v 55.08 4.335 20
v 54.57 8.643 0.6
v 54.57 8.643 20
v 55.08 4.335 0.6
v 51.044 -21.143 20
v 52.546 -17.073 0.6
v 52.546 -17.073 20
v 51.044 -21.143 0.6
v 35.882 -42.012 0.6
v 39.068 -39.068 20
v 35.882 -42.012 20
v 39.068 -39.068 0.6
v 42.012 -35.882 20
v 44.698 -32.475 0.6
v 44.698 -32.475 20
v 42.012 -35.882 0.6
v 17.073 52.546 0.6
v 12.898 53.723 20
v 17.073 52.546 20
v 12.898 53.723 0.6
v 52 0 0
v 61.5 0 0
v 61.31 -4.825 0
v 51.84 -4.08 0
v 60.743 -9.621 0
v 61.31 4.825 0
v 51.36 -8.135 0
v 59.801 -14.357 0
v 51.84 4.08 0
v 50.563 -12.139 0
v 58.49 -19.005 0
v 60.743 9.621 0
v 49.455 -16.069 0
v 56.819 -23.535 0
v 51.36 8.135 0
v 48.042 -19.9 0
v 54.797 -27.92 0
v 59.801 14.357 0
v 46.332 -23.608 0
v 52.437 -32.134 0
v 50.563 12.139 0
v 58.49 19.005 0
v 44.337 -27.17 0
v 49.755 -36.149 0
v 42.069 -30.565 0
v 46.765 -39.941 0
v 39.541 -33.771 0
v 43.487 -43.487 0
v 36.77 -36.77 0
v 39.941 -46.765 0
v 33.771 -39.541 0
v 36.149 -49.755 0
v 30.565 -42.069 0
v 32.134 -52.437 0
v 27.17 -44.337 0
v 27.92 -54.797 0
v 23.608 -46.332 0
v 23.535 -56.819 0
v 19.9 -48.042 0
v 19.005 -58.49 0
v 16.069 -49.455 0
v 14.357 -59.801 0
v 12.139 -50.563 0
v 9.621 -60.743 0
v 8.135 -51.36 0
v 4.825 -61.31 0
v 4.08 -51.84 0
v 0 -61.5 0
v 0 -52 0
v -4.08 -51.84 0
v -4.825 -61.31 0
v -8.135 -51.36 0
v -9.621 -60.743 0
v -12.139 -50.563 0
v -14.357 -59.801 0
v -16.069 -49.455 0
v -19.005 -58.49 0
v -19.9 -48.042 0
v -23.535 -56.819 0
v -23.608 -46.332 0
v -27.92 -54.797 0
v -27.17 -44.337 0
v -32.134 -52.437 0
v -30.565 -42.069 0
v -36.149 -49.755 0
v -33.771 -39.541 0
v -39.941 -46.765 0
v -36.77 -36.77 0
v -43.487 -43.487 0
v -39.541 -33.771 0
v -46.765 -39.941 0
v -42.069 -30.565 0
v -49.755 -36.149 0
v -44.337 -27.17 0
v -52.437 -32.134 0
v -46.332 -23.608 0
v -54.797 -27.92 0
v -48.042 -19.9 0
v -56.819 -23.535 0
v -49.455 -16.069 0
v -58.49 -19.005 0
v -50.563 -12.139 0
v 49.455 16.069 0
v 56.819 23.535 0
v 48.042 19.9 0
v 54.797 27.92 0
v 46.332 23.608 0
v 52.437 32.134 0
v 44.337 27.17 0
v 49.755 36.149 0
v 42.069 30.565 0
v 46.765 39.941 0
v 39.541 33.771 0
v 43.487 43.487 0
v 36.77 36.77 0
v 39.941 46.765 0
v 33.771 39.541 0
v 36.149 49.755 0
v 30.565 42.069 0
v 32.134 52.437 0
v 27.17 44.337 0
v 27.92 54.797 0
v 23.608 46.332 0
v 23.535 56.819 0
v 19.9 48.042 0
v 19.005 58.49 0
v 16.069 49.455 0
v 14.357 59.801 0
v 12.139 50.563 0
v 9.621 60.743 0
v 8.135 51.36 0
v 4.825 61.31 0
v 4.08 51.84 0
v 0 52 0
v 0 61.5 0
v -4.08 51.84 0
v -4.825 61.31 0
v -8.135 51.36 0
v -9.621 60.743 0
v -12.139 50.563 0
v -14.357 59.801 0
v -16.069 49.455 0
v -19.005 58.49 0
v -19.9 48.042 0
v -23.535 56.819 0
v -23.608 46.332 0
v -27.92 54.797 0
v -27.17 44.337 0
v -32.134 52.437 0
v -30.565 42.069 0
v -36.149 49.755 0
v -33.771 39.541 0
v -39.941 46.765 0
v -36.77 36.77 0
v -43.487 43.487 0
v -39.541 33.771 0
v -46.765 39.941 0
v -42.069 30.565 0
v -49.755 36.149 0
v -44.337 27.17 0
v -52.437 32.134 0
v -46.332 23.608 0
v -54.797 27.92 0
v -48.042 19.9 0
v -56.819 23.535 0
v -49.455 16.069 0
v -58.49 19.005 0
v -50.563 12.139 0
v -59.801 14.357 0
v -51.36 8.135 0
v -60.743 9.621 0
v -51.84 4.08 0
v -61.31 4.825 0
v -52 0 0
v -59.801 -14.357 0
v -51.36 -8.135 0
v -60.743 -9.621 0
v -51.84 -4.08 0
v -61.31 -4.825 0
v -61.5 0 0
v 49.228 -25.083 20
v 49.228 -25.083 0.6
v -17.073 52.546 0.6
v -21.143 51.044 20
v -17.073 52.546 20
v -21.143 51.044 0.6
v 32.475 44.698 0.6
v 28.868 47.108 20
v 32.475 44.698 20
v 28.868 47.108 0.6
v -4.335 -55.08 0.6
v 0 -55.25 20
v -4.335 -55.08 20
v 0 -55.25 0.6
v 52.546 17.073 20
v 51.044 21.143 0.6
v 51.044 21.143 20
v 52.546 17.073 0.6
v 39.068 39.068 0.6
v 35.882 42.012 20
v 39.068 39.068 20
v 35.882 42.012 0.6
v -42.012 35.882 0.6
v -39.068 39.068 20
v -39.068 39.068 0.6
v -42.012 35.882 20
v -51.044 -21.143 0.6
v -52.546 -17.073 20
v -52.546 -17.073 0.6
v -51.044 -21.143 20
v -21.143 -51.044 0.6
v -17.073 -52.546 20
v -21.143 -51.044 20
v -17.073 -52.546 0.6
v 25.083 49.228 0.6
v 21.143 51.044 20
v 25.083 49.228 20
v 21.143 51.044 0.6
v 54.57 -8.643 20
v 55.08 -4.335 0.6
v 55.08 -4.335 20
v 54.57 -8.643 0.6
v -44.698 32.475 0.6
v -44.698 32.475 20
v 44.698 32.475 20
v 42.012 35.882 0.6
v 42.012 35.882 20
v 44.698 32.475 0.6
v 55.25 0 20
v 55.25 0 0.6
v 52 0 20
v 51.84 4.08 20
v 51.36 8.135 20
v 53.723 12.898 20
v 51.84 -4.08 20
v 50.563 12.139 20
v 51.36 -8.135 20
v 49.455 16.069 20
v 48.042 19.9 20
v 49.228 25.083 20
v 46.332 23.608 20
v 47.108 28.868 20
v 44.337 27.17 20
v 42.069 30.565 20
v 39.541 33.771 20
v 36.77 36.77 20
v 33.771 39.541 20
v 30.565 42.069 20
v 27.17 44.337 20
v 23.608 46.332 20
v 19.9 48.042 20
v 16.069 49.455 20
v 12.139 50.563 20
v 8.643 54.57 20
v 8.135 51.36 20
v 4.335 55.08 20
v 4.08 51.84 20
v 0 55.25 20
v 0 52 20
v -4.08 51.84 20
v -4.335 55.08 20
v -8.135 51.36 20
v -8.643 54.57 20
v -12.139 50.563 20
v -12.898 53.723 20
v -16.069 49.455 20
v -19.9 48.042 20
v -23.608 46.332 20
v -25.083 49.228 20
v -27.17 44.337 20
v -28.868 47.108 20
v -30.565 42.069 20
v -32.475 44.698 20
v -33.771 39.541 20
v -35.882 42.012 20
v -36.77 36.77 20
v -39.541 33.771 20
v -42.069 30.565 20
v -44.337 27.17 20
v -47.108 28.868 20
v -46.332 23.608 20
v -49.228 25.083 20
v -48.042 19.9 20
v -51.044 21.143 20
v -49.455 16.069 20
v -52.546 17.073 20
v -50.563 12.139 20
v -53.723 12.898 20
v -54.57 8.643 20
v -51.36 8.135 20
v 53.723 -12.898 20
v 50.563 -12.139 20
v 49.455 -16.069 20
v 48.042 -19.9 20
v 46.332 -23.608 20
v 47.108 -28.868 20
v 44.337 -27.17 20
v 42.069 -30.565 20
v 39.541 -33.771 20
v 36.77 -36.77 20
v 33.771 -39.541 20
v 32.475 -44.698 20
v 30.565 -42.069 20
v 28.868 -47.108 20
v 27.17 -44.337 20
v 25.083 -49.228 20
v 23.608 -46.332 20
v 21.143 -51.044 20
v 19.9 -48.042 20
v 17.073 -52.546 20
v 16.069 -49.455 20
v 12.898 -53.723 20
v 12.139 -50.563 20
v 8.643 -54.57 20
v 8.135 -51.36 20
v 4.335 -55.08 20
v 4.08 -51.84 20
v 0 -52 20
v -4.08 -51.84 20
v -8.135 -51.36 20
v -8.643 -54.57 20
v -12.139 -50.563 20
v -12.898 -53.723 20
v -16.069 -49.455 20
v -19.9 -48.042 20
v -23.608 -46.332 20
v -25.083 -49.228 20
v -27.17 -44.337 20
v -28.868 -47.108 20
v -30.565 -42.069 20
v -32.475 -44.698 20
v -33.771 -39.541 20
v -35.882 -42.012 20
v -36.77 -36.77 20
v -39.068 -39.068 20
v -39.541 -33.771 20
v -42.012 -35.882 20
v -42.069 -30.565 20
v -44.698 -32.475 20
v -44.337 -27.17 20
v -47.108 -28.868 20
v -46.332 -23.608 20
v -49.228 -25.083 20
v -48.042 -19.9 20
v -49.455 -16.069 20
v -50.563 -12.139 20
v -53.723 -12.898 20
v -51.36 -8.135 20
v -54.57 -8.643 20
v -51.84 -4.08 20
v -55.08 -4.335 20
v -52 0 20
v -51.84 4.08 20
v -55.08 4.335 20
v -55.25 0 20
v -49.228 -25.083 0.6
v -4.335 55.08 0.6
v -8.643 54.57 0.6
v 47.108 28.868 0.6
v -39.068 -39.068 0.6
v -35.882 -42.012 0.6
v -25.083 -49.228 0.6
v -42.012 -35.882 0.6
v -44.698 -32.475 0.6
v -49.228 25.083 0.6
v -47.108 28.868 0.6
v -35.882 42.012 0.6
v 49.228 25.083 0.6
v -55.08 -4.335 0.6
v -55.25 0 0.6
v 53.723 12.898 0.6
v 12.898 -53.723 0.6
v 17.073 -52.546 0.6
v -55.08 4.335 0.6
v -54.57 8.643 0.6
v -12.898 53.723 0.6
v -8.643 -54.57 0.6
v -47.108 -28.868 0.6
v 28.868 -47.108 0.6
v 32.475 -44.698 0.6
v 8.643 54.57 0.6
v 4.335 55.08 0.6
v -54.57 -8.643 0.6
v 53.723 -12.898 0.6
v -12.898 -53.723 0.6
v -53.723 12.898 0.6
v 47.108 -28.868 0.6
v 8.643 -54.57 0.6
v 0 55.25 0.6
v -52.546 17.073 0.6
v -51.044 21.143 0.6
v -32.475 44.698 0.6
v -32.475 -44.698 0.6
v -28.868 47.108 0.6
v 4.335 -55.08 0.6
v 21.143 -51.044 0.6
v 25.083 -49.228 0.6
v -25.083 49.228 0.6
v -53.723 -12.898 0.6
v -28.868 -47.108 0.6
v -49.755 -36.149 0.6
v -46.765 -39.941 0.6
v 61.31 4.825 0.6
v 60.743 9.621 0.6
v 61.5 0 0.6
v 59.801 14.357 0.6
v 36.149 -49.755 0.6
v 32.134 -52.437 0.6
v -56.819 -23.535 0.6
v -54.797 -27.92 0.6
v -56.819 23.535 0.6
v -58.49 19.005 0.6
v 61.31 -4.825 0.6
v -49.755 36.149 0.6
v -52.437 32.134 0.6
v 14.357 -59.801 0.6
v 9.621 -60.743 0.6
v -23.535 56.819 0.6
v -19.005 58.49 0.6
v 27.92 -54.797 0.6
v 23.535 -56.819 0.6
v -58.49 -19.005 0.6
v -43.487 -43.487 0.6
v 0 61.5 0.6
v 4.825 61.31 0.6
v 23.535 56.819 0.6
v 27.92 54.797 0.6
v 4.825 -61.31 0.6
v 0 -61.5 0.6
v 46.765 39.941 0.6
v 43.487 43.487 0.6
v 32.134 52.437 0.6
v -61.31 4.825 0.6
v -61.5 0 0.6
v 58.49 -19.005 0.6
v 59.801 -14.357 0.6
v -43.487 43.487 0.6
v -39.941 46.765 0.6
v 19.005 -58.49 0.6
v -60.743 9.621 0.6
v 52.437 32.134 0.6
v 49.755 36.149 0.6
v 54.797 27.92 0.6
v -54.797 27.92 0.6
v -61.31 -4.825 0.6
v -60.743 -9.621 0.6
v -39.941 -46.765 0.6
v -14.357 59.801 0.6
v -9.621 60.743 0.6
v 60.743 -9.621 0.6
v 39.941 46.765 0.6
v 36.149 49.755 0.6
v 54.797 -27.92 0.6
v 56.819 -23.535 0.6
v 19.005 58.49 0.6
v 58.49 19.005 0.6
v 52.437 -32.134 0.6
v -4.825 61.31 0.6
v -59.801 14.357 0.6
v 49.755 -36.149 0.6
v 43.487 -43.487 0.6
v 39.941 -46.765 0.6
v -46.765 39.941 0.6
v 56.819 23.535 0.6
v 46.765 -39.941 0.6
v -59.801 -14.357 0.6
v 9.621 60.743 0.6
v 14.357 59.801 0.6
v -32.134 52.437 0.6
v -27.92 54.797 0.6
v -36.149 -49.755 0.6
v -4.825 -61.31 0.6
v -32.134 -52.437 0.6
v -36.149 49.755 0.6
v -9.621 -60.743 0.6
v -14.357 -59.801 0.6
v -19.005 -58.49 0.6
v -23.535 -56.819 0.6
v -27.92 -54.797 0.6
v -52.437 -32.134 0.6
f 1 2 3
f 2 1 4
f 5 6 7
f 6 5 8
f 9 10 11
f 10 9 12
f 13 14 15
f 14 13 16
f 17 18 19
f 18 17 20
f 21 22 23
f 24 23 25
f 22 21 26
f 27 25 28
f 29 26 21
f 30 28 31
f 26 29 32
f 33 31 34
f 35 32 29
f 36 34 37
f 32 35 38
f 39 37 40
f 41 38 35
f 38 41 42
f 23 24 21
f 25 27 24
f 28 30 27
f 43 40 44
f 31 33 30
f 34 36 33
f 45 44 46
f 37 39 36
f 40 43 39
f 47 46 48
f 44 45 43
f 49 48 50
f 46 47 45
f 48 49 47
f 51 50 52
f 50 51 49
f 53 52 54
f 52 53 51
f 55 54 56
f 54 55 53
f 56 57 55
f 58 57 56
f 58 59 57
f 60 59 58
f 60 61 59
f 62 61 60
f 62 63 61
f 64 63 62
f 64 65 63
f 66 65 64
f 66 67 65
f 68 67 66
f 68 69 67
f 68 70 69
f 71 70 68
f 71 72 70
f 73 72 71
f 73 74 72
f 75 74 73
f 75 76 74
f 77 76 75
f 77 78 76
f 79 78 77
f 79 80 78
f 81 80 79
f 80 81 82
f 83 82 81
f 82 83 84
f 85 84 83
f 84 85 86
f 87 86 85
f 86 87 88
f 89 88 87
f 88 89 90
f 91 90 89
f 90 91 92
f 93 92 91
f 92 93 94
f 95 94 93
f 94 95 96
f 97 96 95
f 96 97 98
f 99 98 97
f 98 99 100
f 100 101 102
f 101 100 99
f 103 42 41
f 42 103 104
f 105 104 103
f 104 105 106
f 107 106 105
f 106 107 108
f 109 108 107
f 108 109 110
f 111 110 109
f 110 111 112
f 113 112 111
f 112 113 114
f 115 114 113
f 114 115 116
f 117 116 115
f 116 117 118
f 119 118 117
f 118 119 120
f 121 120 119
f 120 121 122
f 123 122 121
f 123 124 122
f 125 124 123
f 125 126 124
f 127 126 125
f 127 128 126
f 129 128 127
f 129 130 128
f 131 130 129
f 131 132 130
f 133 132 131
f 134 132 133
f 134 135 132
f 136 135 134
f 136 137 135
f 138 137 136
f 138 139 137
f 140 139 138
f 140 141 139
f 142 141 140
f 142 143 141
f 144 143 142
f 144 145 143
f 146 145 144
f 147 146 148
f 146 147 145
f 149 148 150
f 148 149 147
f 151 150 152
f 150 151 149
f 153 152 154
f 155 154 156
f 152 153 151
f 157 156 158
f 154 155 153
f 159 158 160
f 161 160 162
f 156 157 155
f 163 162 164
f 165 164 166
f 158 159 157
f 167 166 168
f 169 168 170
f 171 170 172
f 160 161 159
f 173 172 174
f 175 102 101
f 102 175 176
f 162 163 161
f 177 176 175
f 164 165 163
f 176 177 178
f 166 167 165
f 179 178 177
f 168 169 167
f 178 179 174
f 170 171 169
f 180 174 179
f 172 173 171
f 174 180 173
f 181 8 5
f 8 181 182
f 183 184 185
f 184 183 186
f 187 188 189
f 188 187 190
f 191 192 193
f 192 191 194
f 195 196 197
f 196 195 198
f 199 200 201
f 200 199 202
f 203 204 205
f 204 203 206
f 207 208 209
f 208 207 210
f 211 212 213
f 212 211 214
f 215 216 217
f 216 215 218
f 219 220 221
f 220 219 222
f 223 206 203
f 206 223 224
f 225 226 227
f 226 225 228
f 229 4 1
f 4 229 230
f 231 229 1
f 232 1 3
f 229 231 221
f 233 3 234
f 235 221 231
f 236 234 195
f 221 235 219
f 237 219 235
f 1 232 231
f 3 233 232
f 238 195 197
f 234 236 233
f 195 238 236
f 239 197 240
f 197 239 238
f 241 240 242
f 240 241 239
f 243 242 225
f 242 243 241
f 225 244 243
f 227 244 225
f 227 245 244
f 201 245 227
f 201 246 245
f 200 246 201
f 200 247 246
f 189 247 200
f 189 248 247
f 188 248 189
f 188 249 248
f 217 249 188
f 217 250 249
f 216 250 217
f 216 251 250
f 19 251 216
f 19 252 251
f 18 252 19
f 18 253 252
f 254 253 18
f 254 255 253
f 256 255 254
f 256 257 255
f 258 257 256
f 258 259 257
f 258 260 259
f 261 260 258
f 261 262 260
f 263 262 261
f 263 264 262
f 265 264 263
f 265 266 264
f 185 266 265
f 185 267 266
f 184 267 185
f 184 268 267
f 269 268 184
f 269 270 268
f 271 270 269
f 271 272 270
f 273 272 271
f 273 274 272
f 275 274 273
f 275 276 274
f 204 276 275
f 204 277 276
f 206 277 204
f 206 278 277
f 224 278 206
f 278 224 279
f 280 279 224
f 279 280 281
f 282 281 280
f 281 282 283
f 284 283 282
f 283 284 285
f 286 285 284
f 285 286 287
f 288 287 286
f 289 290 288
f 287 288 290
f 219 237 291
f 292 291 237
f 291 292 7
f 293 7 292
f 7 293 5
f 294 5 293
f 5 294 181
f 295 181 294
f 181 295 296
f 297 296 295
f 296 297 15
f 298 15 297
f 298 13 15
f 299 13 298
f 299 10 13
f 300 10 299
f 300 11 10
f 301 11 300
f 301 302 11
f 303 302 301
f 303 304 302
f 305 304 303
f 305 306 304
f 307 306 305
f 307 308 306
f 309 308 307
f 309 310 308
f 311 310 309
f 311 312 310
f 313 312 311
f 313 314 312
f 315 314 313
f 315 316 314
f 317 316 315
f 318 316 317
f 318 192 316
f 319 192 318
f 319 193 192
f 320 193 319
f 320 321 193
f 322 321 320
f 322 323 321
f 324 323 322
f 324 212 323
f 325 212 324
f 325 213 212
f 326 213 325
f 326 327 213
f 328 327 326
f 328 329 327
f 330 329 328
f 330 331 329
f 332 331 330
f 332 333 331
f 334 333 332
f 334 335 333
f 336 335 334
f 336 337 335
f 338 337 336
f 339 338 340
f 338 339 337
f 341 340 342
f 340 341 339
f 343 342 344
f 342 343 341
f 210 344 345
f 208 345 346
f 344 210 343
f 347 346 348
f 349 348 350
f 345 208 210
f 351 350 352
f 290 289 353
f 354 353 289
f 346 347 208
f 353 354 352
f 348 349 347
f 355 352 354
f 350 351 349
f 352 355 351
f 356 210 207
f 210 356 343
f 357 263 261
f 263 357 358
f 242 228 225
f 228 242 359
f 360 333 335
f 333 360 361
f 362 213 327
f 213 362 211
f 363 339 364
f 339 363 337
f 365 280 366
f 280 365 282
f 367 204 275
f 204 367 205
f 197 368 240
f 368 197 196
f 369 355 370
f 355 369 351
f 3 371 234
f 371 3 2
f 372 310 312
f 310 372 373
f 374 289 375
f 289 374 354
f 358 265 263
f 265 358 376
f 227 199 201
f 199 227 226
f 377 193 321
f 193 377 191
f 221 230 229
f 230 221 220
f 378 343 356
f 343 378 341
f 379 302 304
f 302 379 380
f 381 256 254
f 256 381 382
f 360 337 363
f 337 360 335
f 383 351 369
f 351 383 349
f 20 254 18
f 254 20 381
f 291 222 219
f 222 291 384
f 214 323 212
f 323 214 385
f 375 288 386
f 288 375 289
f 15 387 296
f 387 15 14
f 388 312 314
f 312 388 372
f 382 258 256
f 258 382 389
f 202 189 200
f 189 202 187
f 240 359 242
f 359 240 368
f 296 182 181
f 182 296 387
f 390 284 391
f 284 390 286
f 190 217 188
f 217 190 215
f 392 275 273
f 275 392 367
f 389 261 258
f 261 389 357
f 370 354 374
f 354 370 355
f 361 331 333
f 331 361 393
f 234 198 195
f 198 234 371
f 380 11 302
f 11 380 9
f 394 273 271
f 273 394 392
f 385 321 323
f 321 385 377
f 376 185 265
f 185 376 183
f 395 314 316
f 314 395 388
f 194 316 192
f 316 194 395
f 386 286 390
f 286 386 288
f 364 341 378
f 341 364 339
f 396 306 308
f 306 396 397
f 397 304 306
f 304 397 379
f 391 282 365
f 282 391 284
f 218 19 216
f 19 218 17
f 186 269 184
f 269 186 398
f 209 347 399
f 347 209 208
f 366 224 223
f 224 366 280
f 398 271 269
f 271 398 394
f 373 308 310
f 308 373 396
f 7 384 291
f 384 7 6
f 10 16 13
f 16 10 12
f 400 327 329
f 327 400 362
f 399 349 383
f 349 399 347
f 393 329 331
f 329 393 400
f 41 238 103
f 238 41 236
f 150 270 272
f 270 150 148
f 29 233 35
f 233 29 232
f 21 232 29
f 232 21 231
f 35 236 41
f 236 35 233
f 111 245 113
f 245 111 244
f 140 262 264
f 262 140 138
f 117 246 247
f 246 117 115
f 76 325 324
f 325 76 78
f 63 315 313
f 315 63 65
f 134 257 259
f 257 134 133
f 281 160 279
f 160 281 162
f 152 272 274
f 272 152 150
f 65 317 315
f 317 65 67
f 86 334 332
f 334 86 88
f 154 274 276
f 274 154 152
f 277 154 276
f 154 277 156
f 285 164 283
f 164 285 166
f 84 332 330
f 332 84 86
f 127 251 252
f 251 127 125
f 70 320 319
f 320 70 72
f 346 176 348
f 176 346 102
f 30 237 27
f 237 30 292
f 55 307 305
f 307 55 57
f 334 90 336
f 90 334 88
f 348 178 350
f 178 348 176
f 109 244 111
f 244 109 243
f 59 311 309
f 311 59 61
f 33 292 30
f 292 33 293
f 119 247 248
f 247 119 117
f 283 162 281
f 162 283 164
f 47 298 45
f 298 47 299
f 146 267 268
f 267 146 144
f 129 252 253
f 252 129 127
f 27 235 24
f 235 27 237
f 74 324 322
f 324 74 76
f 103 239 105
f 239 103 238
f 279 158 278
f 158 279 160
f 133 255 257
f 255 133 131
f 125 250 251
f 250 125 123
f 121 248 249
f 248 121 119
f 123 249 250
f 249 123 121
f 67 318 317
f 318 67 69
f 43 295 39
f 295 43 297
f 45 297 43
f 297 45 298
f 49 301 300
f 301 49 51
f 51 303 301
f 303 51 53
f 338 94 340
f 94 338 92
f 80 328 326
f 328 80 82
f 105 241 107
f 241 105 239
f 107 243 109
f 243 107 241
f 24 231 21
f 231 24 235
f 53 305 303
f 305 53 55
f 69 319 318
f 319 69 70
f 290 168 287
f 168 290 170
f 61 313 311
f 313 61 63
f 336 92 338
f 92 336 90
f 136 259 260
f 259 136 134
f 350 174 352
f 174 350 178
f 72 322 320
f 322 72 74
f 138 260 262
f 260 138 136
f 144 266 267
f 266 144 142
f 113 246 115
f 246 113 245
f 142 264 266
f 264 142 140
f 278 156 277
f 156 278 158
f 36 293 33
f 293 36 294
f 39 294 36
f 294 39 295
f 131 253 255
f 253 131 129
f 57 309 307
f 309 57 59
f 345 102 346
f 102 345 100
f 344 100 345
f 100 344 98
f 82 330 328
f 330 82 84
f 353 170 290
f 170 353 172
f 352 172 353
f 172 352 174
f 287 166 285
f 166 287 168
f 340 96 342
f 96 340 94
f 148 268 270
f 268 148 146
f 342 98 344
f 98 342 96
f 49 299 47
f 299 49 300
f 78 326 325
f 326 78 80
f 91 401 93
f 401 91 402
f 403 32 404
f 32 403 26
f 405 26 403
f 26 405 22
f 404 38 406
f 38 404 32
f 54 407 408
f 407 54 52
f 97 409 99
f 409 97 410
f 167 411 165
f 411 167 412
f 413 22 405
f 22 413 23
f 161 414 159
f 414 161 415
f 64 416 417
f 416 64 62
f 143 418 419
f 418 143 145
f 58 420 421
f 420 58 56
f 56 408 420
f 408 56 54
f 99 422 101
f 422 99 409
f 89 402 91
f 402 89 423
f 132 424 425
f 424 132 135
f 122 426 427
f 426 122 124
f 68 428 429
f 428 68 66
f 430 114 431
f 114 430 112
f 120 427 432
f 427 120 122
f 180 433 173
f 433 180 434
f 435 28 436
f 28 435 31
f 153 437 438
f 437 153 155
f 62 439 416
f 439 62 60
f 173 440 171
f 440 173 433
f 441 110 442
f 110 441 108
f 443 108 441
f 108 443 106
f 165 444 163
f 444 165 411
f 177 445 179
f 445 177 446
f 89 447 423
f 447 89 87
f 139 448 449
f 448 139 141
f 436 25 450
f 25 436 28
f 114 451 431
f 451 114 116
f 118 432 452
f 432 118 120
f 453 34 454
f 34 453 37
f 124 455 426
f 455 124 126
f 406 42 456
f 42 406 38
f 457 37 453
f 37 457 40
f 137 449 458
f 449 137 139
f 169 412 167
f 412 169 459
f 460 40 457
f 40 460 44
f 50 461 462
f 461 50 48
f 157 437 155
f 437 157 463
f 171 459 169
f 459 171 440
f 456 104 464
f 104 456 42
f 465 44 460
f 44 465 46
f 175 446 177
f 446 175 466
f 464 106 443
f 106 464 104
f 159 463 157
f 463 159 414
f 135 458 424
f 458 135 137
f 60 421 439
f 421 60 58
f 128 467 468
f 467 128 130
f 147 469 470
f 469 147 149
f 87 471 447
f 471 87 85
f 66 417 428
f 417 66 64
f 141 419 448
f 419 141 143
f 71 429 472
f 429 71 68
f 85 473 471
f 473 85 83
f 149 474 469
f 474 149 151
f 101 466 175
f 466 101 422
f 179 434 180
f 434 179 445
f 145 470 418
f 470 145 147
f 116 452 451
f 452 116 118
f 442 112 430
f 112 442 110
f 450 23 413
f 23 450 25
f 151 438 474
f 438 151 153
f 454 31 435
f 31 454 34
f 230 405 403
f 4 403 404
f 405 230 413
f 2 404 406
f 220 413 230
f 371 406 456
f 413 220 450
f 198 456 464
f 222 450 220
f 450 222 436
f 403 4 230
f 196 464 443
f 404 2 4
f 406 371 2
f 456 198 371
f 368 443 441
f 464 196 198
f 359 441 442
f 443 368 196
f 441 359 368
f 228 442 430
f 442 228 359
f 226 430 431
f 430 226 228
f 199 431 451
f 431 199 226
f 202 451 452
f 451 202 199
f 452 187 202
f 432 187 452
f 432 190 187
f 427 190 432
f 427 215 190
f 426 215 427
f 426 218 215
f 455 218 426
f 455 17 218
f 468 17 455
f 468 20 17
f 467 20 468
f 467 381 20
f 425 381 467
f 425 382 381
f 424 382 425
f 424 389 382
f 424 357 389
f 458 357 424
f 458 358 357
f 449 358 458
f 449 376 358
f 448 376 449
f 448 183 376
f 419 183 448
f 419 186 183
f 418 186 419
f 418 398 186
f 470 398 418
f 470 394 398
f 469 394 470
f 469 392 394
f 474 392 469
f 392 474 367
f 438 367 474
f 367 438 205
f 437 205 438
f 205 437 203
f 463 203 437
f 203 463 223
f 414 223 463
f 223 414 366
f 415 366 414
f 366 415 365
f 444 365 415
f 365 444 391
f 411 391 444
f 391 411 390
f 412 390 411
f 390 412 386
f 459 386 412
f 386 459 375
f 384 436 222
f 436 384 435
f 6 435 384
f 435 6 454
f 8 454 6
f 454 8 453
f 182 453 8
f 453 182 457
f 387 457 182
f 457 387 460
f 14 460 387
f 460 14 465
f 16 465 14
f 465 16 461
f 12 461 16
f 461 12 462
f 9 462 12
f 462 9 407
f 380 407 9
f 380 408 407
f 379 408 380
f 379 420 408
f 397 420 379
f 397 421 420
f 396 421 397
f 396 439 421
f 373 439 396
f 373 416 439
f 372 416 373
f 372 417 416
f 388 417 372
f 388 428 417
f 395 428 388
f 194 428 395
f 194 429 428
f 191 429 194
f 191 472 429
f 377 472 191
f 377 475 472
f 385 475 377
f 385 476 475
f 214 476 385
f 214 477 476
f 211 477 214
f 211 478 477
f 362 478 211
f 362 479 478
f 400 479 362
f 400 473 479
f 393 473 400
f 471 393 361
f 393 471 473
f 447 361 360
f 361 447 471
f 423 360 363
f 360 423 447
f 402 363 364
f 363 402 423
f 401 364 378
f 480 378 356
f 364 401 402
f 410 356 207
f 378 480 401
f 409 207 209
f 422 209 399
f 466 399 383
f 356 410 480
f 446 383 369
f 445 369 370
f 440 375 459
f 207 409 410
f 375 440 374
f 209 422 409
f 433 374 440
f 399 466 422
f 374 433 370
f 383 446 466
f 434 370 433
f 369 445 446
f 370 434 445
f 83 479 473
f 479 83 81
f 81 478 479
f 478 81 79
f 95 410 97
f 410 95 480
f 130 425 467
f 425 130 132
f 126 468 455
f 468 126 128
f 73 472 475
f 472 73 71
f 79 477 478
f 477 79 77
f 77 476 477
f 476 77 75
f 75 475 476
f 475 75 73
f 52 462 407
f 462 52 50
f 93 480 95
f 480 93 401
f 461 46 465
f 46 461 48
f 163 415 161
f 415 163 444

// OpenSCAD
// On: https://satakagi.github.io/tribahtinovWebApps/Tri-Bahtinov_symmetric.html
//  F.L..:  mm
//  Build mount holes: unchecked
//  Focal Length: 3910
//  OuterDiameter: 355.5
//  Inner Diameter: 114
//  StemWidth:SlitWidth: 1:1
//  Use 3rd order spectrum: Unchecked
//  Bahtinov Fadctor: 150
//  inW:5.99948 outW:11.125
//  Rounding: unchecked
//
// Also see: https://satakagi.github.io/tribahtinovWebApps/reports/improveSensitivity.html
//
// Load in inkscape and remove the outer circle and save as triBhatinovMask.svg and save
// Open triBhatinovMask.svg and make sure the viewBox origin is 0, 0  not -396,-396 to ensure mask is centered


// Print: No support, 35% infill, Low Quality

partNum                         = 3;      // 0 = All, 1 = Mask, 2 = Cover, Center Support


maskOutsideDiameter             = 388;
clearAperture                   = 203.2;
secondaryMirrorDiameter         = 112;
secondaryMirrorHandleHeight     = 20;
secondaryMirrorHandleThickness  = 2;
maskThickness                   = 1.0;
coverMiddleRingDiameter         = 228;
coverSegmentAngle               = 120;
coverHandleThickness            = 2;
coverHandleHeight               = secondaryMirrorHandleHeight - maskThickness;
coverhandleInnerDiameter        = secondaryMirrorDiameter + secondaryMirrorHandleThickness * 2 + 2;
svgFilename                     = "triBahtinovMask.svg";

manifoldCorrection              = 0.01;
$fn                             = 80;


if ( partNum == 0 || partNum == 1 )
    mask();
if ( partNum == 0 || partNum == 2 )
{
    translate( [0, 0, maskThickness] )
        cover();
}
if ( partNum == 0 || partNum == 3 )
{
    centerSupport();
}



module centerSupport()
{
    donut(secondaryMirrorDiameter - 1.5, 104, secondaryMirrorHandleHeight );
    donut(coverhandleInnerDiameter + 5.0, 104, 0.6);
}



module cover()
{
    difference()
    {
        cylinder(d=maskOutsideDiameter, h=maskThickness);
        translate( [0, 0, -manifoldCorrection] )
            scale( [1.0, 1.0, 2.0] )
                coverCutoutPositive();        
        translate( [0, 0, -manifoldCorrection] )
            cylinder(d=coverhandleInnerDiameter, h=maskThickness + manifoldCorrection * 2);
    }
    
    donut(coverhandleInnerDiameter + coverHandleThickness * 2, coverhandleInnerDiameter, coverHandleHeight);
}



module coverCutoutPositive()
{
    
    pieSlice(coverMiddleRingDiameter, maskThickness + manifoldCorrection * 2, coverSegmentAngle);

    rotate( [0, 0, 180] )
    {
        difference()
        {
            pieSlice(maskOutsideDiameter + manifoldCorrection * 2, maskThickness, coverSegmentAngle);
            translate( [0, 0, -manifoldCorrection] )
                cylinder(d=coverMiddleRingDiameter, h=maskThickness + manifoldCorrection * 4);
        }
    }
}




module mask()
{
    difference()
    {
        donut(maskOutsideDiameter, secondaryMirrorDiameter, maskThickness);
        translate( [0, 0, -manifoldCorrection] )                
            linear_extrude(height=maskThickness + manifoldCorrection * 2)
                import(file=svgFilename, center=true, dpi=72);
    }

    donut(secondaryMirrorDiameter + secondaryMirrorHandleThickness * 2, secondaryMirrorDiameter, secondaryMirrorHandleHeight);
    //color( [1.0, 0, 0] )
    //    donut(clearAperture, secondaryMirrorDiameter, maskThickness);
}



module donut(outerDiameter, innerDiameter, height)
{
    difference()
    {
        cylinder(d=outerDiameter, h=height);
        translate( [0, 0, -manifoldCorrection] )
            cylinder(d=innerDiameter, h=height + manifoldCorrection * 2);
    }
}



module pieSlice(outerDiameter, thickness, angle)
{
    rotate( [0, 0, -90] )
        difference()
        {
            cylinder(d=outerDiameter, h = thickness);
            rotate( [0, 0, angle/2] )
                translate( [0, -outerDiameter, -manifoldCorrection] )
                    cube( [outerDiameter, outerDiameter * 2, thickness + manifoldCorrection * 2]);
            rotate( [0, 0, -angle/2] )
                translate( [-outerDiameter, -outerDiameter, -manifoldCorrection] )
                    cube( [outerDiameter, outerDiameter * 2, thickness + manifoldCorrection * 2]);
        }
}
